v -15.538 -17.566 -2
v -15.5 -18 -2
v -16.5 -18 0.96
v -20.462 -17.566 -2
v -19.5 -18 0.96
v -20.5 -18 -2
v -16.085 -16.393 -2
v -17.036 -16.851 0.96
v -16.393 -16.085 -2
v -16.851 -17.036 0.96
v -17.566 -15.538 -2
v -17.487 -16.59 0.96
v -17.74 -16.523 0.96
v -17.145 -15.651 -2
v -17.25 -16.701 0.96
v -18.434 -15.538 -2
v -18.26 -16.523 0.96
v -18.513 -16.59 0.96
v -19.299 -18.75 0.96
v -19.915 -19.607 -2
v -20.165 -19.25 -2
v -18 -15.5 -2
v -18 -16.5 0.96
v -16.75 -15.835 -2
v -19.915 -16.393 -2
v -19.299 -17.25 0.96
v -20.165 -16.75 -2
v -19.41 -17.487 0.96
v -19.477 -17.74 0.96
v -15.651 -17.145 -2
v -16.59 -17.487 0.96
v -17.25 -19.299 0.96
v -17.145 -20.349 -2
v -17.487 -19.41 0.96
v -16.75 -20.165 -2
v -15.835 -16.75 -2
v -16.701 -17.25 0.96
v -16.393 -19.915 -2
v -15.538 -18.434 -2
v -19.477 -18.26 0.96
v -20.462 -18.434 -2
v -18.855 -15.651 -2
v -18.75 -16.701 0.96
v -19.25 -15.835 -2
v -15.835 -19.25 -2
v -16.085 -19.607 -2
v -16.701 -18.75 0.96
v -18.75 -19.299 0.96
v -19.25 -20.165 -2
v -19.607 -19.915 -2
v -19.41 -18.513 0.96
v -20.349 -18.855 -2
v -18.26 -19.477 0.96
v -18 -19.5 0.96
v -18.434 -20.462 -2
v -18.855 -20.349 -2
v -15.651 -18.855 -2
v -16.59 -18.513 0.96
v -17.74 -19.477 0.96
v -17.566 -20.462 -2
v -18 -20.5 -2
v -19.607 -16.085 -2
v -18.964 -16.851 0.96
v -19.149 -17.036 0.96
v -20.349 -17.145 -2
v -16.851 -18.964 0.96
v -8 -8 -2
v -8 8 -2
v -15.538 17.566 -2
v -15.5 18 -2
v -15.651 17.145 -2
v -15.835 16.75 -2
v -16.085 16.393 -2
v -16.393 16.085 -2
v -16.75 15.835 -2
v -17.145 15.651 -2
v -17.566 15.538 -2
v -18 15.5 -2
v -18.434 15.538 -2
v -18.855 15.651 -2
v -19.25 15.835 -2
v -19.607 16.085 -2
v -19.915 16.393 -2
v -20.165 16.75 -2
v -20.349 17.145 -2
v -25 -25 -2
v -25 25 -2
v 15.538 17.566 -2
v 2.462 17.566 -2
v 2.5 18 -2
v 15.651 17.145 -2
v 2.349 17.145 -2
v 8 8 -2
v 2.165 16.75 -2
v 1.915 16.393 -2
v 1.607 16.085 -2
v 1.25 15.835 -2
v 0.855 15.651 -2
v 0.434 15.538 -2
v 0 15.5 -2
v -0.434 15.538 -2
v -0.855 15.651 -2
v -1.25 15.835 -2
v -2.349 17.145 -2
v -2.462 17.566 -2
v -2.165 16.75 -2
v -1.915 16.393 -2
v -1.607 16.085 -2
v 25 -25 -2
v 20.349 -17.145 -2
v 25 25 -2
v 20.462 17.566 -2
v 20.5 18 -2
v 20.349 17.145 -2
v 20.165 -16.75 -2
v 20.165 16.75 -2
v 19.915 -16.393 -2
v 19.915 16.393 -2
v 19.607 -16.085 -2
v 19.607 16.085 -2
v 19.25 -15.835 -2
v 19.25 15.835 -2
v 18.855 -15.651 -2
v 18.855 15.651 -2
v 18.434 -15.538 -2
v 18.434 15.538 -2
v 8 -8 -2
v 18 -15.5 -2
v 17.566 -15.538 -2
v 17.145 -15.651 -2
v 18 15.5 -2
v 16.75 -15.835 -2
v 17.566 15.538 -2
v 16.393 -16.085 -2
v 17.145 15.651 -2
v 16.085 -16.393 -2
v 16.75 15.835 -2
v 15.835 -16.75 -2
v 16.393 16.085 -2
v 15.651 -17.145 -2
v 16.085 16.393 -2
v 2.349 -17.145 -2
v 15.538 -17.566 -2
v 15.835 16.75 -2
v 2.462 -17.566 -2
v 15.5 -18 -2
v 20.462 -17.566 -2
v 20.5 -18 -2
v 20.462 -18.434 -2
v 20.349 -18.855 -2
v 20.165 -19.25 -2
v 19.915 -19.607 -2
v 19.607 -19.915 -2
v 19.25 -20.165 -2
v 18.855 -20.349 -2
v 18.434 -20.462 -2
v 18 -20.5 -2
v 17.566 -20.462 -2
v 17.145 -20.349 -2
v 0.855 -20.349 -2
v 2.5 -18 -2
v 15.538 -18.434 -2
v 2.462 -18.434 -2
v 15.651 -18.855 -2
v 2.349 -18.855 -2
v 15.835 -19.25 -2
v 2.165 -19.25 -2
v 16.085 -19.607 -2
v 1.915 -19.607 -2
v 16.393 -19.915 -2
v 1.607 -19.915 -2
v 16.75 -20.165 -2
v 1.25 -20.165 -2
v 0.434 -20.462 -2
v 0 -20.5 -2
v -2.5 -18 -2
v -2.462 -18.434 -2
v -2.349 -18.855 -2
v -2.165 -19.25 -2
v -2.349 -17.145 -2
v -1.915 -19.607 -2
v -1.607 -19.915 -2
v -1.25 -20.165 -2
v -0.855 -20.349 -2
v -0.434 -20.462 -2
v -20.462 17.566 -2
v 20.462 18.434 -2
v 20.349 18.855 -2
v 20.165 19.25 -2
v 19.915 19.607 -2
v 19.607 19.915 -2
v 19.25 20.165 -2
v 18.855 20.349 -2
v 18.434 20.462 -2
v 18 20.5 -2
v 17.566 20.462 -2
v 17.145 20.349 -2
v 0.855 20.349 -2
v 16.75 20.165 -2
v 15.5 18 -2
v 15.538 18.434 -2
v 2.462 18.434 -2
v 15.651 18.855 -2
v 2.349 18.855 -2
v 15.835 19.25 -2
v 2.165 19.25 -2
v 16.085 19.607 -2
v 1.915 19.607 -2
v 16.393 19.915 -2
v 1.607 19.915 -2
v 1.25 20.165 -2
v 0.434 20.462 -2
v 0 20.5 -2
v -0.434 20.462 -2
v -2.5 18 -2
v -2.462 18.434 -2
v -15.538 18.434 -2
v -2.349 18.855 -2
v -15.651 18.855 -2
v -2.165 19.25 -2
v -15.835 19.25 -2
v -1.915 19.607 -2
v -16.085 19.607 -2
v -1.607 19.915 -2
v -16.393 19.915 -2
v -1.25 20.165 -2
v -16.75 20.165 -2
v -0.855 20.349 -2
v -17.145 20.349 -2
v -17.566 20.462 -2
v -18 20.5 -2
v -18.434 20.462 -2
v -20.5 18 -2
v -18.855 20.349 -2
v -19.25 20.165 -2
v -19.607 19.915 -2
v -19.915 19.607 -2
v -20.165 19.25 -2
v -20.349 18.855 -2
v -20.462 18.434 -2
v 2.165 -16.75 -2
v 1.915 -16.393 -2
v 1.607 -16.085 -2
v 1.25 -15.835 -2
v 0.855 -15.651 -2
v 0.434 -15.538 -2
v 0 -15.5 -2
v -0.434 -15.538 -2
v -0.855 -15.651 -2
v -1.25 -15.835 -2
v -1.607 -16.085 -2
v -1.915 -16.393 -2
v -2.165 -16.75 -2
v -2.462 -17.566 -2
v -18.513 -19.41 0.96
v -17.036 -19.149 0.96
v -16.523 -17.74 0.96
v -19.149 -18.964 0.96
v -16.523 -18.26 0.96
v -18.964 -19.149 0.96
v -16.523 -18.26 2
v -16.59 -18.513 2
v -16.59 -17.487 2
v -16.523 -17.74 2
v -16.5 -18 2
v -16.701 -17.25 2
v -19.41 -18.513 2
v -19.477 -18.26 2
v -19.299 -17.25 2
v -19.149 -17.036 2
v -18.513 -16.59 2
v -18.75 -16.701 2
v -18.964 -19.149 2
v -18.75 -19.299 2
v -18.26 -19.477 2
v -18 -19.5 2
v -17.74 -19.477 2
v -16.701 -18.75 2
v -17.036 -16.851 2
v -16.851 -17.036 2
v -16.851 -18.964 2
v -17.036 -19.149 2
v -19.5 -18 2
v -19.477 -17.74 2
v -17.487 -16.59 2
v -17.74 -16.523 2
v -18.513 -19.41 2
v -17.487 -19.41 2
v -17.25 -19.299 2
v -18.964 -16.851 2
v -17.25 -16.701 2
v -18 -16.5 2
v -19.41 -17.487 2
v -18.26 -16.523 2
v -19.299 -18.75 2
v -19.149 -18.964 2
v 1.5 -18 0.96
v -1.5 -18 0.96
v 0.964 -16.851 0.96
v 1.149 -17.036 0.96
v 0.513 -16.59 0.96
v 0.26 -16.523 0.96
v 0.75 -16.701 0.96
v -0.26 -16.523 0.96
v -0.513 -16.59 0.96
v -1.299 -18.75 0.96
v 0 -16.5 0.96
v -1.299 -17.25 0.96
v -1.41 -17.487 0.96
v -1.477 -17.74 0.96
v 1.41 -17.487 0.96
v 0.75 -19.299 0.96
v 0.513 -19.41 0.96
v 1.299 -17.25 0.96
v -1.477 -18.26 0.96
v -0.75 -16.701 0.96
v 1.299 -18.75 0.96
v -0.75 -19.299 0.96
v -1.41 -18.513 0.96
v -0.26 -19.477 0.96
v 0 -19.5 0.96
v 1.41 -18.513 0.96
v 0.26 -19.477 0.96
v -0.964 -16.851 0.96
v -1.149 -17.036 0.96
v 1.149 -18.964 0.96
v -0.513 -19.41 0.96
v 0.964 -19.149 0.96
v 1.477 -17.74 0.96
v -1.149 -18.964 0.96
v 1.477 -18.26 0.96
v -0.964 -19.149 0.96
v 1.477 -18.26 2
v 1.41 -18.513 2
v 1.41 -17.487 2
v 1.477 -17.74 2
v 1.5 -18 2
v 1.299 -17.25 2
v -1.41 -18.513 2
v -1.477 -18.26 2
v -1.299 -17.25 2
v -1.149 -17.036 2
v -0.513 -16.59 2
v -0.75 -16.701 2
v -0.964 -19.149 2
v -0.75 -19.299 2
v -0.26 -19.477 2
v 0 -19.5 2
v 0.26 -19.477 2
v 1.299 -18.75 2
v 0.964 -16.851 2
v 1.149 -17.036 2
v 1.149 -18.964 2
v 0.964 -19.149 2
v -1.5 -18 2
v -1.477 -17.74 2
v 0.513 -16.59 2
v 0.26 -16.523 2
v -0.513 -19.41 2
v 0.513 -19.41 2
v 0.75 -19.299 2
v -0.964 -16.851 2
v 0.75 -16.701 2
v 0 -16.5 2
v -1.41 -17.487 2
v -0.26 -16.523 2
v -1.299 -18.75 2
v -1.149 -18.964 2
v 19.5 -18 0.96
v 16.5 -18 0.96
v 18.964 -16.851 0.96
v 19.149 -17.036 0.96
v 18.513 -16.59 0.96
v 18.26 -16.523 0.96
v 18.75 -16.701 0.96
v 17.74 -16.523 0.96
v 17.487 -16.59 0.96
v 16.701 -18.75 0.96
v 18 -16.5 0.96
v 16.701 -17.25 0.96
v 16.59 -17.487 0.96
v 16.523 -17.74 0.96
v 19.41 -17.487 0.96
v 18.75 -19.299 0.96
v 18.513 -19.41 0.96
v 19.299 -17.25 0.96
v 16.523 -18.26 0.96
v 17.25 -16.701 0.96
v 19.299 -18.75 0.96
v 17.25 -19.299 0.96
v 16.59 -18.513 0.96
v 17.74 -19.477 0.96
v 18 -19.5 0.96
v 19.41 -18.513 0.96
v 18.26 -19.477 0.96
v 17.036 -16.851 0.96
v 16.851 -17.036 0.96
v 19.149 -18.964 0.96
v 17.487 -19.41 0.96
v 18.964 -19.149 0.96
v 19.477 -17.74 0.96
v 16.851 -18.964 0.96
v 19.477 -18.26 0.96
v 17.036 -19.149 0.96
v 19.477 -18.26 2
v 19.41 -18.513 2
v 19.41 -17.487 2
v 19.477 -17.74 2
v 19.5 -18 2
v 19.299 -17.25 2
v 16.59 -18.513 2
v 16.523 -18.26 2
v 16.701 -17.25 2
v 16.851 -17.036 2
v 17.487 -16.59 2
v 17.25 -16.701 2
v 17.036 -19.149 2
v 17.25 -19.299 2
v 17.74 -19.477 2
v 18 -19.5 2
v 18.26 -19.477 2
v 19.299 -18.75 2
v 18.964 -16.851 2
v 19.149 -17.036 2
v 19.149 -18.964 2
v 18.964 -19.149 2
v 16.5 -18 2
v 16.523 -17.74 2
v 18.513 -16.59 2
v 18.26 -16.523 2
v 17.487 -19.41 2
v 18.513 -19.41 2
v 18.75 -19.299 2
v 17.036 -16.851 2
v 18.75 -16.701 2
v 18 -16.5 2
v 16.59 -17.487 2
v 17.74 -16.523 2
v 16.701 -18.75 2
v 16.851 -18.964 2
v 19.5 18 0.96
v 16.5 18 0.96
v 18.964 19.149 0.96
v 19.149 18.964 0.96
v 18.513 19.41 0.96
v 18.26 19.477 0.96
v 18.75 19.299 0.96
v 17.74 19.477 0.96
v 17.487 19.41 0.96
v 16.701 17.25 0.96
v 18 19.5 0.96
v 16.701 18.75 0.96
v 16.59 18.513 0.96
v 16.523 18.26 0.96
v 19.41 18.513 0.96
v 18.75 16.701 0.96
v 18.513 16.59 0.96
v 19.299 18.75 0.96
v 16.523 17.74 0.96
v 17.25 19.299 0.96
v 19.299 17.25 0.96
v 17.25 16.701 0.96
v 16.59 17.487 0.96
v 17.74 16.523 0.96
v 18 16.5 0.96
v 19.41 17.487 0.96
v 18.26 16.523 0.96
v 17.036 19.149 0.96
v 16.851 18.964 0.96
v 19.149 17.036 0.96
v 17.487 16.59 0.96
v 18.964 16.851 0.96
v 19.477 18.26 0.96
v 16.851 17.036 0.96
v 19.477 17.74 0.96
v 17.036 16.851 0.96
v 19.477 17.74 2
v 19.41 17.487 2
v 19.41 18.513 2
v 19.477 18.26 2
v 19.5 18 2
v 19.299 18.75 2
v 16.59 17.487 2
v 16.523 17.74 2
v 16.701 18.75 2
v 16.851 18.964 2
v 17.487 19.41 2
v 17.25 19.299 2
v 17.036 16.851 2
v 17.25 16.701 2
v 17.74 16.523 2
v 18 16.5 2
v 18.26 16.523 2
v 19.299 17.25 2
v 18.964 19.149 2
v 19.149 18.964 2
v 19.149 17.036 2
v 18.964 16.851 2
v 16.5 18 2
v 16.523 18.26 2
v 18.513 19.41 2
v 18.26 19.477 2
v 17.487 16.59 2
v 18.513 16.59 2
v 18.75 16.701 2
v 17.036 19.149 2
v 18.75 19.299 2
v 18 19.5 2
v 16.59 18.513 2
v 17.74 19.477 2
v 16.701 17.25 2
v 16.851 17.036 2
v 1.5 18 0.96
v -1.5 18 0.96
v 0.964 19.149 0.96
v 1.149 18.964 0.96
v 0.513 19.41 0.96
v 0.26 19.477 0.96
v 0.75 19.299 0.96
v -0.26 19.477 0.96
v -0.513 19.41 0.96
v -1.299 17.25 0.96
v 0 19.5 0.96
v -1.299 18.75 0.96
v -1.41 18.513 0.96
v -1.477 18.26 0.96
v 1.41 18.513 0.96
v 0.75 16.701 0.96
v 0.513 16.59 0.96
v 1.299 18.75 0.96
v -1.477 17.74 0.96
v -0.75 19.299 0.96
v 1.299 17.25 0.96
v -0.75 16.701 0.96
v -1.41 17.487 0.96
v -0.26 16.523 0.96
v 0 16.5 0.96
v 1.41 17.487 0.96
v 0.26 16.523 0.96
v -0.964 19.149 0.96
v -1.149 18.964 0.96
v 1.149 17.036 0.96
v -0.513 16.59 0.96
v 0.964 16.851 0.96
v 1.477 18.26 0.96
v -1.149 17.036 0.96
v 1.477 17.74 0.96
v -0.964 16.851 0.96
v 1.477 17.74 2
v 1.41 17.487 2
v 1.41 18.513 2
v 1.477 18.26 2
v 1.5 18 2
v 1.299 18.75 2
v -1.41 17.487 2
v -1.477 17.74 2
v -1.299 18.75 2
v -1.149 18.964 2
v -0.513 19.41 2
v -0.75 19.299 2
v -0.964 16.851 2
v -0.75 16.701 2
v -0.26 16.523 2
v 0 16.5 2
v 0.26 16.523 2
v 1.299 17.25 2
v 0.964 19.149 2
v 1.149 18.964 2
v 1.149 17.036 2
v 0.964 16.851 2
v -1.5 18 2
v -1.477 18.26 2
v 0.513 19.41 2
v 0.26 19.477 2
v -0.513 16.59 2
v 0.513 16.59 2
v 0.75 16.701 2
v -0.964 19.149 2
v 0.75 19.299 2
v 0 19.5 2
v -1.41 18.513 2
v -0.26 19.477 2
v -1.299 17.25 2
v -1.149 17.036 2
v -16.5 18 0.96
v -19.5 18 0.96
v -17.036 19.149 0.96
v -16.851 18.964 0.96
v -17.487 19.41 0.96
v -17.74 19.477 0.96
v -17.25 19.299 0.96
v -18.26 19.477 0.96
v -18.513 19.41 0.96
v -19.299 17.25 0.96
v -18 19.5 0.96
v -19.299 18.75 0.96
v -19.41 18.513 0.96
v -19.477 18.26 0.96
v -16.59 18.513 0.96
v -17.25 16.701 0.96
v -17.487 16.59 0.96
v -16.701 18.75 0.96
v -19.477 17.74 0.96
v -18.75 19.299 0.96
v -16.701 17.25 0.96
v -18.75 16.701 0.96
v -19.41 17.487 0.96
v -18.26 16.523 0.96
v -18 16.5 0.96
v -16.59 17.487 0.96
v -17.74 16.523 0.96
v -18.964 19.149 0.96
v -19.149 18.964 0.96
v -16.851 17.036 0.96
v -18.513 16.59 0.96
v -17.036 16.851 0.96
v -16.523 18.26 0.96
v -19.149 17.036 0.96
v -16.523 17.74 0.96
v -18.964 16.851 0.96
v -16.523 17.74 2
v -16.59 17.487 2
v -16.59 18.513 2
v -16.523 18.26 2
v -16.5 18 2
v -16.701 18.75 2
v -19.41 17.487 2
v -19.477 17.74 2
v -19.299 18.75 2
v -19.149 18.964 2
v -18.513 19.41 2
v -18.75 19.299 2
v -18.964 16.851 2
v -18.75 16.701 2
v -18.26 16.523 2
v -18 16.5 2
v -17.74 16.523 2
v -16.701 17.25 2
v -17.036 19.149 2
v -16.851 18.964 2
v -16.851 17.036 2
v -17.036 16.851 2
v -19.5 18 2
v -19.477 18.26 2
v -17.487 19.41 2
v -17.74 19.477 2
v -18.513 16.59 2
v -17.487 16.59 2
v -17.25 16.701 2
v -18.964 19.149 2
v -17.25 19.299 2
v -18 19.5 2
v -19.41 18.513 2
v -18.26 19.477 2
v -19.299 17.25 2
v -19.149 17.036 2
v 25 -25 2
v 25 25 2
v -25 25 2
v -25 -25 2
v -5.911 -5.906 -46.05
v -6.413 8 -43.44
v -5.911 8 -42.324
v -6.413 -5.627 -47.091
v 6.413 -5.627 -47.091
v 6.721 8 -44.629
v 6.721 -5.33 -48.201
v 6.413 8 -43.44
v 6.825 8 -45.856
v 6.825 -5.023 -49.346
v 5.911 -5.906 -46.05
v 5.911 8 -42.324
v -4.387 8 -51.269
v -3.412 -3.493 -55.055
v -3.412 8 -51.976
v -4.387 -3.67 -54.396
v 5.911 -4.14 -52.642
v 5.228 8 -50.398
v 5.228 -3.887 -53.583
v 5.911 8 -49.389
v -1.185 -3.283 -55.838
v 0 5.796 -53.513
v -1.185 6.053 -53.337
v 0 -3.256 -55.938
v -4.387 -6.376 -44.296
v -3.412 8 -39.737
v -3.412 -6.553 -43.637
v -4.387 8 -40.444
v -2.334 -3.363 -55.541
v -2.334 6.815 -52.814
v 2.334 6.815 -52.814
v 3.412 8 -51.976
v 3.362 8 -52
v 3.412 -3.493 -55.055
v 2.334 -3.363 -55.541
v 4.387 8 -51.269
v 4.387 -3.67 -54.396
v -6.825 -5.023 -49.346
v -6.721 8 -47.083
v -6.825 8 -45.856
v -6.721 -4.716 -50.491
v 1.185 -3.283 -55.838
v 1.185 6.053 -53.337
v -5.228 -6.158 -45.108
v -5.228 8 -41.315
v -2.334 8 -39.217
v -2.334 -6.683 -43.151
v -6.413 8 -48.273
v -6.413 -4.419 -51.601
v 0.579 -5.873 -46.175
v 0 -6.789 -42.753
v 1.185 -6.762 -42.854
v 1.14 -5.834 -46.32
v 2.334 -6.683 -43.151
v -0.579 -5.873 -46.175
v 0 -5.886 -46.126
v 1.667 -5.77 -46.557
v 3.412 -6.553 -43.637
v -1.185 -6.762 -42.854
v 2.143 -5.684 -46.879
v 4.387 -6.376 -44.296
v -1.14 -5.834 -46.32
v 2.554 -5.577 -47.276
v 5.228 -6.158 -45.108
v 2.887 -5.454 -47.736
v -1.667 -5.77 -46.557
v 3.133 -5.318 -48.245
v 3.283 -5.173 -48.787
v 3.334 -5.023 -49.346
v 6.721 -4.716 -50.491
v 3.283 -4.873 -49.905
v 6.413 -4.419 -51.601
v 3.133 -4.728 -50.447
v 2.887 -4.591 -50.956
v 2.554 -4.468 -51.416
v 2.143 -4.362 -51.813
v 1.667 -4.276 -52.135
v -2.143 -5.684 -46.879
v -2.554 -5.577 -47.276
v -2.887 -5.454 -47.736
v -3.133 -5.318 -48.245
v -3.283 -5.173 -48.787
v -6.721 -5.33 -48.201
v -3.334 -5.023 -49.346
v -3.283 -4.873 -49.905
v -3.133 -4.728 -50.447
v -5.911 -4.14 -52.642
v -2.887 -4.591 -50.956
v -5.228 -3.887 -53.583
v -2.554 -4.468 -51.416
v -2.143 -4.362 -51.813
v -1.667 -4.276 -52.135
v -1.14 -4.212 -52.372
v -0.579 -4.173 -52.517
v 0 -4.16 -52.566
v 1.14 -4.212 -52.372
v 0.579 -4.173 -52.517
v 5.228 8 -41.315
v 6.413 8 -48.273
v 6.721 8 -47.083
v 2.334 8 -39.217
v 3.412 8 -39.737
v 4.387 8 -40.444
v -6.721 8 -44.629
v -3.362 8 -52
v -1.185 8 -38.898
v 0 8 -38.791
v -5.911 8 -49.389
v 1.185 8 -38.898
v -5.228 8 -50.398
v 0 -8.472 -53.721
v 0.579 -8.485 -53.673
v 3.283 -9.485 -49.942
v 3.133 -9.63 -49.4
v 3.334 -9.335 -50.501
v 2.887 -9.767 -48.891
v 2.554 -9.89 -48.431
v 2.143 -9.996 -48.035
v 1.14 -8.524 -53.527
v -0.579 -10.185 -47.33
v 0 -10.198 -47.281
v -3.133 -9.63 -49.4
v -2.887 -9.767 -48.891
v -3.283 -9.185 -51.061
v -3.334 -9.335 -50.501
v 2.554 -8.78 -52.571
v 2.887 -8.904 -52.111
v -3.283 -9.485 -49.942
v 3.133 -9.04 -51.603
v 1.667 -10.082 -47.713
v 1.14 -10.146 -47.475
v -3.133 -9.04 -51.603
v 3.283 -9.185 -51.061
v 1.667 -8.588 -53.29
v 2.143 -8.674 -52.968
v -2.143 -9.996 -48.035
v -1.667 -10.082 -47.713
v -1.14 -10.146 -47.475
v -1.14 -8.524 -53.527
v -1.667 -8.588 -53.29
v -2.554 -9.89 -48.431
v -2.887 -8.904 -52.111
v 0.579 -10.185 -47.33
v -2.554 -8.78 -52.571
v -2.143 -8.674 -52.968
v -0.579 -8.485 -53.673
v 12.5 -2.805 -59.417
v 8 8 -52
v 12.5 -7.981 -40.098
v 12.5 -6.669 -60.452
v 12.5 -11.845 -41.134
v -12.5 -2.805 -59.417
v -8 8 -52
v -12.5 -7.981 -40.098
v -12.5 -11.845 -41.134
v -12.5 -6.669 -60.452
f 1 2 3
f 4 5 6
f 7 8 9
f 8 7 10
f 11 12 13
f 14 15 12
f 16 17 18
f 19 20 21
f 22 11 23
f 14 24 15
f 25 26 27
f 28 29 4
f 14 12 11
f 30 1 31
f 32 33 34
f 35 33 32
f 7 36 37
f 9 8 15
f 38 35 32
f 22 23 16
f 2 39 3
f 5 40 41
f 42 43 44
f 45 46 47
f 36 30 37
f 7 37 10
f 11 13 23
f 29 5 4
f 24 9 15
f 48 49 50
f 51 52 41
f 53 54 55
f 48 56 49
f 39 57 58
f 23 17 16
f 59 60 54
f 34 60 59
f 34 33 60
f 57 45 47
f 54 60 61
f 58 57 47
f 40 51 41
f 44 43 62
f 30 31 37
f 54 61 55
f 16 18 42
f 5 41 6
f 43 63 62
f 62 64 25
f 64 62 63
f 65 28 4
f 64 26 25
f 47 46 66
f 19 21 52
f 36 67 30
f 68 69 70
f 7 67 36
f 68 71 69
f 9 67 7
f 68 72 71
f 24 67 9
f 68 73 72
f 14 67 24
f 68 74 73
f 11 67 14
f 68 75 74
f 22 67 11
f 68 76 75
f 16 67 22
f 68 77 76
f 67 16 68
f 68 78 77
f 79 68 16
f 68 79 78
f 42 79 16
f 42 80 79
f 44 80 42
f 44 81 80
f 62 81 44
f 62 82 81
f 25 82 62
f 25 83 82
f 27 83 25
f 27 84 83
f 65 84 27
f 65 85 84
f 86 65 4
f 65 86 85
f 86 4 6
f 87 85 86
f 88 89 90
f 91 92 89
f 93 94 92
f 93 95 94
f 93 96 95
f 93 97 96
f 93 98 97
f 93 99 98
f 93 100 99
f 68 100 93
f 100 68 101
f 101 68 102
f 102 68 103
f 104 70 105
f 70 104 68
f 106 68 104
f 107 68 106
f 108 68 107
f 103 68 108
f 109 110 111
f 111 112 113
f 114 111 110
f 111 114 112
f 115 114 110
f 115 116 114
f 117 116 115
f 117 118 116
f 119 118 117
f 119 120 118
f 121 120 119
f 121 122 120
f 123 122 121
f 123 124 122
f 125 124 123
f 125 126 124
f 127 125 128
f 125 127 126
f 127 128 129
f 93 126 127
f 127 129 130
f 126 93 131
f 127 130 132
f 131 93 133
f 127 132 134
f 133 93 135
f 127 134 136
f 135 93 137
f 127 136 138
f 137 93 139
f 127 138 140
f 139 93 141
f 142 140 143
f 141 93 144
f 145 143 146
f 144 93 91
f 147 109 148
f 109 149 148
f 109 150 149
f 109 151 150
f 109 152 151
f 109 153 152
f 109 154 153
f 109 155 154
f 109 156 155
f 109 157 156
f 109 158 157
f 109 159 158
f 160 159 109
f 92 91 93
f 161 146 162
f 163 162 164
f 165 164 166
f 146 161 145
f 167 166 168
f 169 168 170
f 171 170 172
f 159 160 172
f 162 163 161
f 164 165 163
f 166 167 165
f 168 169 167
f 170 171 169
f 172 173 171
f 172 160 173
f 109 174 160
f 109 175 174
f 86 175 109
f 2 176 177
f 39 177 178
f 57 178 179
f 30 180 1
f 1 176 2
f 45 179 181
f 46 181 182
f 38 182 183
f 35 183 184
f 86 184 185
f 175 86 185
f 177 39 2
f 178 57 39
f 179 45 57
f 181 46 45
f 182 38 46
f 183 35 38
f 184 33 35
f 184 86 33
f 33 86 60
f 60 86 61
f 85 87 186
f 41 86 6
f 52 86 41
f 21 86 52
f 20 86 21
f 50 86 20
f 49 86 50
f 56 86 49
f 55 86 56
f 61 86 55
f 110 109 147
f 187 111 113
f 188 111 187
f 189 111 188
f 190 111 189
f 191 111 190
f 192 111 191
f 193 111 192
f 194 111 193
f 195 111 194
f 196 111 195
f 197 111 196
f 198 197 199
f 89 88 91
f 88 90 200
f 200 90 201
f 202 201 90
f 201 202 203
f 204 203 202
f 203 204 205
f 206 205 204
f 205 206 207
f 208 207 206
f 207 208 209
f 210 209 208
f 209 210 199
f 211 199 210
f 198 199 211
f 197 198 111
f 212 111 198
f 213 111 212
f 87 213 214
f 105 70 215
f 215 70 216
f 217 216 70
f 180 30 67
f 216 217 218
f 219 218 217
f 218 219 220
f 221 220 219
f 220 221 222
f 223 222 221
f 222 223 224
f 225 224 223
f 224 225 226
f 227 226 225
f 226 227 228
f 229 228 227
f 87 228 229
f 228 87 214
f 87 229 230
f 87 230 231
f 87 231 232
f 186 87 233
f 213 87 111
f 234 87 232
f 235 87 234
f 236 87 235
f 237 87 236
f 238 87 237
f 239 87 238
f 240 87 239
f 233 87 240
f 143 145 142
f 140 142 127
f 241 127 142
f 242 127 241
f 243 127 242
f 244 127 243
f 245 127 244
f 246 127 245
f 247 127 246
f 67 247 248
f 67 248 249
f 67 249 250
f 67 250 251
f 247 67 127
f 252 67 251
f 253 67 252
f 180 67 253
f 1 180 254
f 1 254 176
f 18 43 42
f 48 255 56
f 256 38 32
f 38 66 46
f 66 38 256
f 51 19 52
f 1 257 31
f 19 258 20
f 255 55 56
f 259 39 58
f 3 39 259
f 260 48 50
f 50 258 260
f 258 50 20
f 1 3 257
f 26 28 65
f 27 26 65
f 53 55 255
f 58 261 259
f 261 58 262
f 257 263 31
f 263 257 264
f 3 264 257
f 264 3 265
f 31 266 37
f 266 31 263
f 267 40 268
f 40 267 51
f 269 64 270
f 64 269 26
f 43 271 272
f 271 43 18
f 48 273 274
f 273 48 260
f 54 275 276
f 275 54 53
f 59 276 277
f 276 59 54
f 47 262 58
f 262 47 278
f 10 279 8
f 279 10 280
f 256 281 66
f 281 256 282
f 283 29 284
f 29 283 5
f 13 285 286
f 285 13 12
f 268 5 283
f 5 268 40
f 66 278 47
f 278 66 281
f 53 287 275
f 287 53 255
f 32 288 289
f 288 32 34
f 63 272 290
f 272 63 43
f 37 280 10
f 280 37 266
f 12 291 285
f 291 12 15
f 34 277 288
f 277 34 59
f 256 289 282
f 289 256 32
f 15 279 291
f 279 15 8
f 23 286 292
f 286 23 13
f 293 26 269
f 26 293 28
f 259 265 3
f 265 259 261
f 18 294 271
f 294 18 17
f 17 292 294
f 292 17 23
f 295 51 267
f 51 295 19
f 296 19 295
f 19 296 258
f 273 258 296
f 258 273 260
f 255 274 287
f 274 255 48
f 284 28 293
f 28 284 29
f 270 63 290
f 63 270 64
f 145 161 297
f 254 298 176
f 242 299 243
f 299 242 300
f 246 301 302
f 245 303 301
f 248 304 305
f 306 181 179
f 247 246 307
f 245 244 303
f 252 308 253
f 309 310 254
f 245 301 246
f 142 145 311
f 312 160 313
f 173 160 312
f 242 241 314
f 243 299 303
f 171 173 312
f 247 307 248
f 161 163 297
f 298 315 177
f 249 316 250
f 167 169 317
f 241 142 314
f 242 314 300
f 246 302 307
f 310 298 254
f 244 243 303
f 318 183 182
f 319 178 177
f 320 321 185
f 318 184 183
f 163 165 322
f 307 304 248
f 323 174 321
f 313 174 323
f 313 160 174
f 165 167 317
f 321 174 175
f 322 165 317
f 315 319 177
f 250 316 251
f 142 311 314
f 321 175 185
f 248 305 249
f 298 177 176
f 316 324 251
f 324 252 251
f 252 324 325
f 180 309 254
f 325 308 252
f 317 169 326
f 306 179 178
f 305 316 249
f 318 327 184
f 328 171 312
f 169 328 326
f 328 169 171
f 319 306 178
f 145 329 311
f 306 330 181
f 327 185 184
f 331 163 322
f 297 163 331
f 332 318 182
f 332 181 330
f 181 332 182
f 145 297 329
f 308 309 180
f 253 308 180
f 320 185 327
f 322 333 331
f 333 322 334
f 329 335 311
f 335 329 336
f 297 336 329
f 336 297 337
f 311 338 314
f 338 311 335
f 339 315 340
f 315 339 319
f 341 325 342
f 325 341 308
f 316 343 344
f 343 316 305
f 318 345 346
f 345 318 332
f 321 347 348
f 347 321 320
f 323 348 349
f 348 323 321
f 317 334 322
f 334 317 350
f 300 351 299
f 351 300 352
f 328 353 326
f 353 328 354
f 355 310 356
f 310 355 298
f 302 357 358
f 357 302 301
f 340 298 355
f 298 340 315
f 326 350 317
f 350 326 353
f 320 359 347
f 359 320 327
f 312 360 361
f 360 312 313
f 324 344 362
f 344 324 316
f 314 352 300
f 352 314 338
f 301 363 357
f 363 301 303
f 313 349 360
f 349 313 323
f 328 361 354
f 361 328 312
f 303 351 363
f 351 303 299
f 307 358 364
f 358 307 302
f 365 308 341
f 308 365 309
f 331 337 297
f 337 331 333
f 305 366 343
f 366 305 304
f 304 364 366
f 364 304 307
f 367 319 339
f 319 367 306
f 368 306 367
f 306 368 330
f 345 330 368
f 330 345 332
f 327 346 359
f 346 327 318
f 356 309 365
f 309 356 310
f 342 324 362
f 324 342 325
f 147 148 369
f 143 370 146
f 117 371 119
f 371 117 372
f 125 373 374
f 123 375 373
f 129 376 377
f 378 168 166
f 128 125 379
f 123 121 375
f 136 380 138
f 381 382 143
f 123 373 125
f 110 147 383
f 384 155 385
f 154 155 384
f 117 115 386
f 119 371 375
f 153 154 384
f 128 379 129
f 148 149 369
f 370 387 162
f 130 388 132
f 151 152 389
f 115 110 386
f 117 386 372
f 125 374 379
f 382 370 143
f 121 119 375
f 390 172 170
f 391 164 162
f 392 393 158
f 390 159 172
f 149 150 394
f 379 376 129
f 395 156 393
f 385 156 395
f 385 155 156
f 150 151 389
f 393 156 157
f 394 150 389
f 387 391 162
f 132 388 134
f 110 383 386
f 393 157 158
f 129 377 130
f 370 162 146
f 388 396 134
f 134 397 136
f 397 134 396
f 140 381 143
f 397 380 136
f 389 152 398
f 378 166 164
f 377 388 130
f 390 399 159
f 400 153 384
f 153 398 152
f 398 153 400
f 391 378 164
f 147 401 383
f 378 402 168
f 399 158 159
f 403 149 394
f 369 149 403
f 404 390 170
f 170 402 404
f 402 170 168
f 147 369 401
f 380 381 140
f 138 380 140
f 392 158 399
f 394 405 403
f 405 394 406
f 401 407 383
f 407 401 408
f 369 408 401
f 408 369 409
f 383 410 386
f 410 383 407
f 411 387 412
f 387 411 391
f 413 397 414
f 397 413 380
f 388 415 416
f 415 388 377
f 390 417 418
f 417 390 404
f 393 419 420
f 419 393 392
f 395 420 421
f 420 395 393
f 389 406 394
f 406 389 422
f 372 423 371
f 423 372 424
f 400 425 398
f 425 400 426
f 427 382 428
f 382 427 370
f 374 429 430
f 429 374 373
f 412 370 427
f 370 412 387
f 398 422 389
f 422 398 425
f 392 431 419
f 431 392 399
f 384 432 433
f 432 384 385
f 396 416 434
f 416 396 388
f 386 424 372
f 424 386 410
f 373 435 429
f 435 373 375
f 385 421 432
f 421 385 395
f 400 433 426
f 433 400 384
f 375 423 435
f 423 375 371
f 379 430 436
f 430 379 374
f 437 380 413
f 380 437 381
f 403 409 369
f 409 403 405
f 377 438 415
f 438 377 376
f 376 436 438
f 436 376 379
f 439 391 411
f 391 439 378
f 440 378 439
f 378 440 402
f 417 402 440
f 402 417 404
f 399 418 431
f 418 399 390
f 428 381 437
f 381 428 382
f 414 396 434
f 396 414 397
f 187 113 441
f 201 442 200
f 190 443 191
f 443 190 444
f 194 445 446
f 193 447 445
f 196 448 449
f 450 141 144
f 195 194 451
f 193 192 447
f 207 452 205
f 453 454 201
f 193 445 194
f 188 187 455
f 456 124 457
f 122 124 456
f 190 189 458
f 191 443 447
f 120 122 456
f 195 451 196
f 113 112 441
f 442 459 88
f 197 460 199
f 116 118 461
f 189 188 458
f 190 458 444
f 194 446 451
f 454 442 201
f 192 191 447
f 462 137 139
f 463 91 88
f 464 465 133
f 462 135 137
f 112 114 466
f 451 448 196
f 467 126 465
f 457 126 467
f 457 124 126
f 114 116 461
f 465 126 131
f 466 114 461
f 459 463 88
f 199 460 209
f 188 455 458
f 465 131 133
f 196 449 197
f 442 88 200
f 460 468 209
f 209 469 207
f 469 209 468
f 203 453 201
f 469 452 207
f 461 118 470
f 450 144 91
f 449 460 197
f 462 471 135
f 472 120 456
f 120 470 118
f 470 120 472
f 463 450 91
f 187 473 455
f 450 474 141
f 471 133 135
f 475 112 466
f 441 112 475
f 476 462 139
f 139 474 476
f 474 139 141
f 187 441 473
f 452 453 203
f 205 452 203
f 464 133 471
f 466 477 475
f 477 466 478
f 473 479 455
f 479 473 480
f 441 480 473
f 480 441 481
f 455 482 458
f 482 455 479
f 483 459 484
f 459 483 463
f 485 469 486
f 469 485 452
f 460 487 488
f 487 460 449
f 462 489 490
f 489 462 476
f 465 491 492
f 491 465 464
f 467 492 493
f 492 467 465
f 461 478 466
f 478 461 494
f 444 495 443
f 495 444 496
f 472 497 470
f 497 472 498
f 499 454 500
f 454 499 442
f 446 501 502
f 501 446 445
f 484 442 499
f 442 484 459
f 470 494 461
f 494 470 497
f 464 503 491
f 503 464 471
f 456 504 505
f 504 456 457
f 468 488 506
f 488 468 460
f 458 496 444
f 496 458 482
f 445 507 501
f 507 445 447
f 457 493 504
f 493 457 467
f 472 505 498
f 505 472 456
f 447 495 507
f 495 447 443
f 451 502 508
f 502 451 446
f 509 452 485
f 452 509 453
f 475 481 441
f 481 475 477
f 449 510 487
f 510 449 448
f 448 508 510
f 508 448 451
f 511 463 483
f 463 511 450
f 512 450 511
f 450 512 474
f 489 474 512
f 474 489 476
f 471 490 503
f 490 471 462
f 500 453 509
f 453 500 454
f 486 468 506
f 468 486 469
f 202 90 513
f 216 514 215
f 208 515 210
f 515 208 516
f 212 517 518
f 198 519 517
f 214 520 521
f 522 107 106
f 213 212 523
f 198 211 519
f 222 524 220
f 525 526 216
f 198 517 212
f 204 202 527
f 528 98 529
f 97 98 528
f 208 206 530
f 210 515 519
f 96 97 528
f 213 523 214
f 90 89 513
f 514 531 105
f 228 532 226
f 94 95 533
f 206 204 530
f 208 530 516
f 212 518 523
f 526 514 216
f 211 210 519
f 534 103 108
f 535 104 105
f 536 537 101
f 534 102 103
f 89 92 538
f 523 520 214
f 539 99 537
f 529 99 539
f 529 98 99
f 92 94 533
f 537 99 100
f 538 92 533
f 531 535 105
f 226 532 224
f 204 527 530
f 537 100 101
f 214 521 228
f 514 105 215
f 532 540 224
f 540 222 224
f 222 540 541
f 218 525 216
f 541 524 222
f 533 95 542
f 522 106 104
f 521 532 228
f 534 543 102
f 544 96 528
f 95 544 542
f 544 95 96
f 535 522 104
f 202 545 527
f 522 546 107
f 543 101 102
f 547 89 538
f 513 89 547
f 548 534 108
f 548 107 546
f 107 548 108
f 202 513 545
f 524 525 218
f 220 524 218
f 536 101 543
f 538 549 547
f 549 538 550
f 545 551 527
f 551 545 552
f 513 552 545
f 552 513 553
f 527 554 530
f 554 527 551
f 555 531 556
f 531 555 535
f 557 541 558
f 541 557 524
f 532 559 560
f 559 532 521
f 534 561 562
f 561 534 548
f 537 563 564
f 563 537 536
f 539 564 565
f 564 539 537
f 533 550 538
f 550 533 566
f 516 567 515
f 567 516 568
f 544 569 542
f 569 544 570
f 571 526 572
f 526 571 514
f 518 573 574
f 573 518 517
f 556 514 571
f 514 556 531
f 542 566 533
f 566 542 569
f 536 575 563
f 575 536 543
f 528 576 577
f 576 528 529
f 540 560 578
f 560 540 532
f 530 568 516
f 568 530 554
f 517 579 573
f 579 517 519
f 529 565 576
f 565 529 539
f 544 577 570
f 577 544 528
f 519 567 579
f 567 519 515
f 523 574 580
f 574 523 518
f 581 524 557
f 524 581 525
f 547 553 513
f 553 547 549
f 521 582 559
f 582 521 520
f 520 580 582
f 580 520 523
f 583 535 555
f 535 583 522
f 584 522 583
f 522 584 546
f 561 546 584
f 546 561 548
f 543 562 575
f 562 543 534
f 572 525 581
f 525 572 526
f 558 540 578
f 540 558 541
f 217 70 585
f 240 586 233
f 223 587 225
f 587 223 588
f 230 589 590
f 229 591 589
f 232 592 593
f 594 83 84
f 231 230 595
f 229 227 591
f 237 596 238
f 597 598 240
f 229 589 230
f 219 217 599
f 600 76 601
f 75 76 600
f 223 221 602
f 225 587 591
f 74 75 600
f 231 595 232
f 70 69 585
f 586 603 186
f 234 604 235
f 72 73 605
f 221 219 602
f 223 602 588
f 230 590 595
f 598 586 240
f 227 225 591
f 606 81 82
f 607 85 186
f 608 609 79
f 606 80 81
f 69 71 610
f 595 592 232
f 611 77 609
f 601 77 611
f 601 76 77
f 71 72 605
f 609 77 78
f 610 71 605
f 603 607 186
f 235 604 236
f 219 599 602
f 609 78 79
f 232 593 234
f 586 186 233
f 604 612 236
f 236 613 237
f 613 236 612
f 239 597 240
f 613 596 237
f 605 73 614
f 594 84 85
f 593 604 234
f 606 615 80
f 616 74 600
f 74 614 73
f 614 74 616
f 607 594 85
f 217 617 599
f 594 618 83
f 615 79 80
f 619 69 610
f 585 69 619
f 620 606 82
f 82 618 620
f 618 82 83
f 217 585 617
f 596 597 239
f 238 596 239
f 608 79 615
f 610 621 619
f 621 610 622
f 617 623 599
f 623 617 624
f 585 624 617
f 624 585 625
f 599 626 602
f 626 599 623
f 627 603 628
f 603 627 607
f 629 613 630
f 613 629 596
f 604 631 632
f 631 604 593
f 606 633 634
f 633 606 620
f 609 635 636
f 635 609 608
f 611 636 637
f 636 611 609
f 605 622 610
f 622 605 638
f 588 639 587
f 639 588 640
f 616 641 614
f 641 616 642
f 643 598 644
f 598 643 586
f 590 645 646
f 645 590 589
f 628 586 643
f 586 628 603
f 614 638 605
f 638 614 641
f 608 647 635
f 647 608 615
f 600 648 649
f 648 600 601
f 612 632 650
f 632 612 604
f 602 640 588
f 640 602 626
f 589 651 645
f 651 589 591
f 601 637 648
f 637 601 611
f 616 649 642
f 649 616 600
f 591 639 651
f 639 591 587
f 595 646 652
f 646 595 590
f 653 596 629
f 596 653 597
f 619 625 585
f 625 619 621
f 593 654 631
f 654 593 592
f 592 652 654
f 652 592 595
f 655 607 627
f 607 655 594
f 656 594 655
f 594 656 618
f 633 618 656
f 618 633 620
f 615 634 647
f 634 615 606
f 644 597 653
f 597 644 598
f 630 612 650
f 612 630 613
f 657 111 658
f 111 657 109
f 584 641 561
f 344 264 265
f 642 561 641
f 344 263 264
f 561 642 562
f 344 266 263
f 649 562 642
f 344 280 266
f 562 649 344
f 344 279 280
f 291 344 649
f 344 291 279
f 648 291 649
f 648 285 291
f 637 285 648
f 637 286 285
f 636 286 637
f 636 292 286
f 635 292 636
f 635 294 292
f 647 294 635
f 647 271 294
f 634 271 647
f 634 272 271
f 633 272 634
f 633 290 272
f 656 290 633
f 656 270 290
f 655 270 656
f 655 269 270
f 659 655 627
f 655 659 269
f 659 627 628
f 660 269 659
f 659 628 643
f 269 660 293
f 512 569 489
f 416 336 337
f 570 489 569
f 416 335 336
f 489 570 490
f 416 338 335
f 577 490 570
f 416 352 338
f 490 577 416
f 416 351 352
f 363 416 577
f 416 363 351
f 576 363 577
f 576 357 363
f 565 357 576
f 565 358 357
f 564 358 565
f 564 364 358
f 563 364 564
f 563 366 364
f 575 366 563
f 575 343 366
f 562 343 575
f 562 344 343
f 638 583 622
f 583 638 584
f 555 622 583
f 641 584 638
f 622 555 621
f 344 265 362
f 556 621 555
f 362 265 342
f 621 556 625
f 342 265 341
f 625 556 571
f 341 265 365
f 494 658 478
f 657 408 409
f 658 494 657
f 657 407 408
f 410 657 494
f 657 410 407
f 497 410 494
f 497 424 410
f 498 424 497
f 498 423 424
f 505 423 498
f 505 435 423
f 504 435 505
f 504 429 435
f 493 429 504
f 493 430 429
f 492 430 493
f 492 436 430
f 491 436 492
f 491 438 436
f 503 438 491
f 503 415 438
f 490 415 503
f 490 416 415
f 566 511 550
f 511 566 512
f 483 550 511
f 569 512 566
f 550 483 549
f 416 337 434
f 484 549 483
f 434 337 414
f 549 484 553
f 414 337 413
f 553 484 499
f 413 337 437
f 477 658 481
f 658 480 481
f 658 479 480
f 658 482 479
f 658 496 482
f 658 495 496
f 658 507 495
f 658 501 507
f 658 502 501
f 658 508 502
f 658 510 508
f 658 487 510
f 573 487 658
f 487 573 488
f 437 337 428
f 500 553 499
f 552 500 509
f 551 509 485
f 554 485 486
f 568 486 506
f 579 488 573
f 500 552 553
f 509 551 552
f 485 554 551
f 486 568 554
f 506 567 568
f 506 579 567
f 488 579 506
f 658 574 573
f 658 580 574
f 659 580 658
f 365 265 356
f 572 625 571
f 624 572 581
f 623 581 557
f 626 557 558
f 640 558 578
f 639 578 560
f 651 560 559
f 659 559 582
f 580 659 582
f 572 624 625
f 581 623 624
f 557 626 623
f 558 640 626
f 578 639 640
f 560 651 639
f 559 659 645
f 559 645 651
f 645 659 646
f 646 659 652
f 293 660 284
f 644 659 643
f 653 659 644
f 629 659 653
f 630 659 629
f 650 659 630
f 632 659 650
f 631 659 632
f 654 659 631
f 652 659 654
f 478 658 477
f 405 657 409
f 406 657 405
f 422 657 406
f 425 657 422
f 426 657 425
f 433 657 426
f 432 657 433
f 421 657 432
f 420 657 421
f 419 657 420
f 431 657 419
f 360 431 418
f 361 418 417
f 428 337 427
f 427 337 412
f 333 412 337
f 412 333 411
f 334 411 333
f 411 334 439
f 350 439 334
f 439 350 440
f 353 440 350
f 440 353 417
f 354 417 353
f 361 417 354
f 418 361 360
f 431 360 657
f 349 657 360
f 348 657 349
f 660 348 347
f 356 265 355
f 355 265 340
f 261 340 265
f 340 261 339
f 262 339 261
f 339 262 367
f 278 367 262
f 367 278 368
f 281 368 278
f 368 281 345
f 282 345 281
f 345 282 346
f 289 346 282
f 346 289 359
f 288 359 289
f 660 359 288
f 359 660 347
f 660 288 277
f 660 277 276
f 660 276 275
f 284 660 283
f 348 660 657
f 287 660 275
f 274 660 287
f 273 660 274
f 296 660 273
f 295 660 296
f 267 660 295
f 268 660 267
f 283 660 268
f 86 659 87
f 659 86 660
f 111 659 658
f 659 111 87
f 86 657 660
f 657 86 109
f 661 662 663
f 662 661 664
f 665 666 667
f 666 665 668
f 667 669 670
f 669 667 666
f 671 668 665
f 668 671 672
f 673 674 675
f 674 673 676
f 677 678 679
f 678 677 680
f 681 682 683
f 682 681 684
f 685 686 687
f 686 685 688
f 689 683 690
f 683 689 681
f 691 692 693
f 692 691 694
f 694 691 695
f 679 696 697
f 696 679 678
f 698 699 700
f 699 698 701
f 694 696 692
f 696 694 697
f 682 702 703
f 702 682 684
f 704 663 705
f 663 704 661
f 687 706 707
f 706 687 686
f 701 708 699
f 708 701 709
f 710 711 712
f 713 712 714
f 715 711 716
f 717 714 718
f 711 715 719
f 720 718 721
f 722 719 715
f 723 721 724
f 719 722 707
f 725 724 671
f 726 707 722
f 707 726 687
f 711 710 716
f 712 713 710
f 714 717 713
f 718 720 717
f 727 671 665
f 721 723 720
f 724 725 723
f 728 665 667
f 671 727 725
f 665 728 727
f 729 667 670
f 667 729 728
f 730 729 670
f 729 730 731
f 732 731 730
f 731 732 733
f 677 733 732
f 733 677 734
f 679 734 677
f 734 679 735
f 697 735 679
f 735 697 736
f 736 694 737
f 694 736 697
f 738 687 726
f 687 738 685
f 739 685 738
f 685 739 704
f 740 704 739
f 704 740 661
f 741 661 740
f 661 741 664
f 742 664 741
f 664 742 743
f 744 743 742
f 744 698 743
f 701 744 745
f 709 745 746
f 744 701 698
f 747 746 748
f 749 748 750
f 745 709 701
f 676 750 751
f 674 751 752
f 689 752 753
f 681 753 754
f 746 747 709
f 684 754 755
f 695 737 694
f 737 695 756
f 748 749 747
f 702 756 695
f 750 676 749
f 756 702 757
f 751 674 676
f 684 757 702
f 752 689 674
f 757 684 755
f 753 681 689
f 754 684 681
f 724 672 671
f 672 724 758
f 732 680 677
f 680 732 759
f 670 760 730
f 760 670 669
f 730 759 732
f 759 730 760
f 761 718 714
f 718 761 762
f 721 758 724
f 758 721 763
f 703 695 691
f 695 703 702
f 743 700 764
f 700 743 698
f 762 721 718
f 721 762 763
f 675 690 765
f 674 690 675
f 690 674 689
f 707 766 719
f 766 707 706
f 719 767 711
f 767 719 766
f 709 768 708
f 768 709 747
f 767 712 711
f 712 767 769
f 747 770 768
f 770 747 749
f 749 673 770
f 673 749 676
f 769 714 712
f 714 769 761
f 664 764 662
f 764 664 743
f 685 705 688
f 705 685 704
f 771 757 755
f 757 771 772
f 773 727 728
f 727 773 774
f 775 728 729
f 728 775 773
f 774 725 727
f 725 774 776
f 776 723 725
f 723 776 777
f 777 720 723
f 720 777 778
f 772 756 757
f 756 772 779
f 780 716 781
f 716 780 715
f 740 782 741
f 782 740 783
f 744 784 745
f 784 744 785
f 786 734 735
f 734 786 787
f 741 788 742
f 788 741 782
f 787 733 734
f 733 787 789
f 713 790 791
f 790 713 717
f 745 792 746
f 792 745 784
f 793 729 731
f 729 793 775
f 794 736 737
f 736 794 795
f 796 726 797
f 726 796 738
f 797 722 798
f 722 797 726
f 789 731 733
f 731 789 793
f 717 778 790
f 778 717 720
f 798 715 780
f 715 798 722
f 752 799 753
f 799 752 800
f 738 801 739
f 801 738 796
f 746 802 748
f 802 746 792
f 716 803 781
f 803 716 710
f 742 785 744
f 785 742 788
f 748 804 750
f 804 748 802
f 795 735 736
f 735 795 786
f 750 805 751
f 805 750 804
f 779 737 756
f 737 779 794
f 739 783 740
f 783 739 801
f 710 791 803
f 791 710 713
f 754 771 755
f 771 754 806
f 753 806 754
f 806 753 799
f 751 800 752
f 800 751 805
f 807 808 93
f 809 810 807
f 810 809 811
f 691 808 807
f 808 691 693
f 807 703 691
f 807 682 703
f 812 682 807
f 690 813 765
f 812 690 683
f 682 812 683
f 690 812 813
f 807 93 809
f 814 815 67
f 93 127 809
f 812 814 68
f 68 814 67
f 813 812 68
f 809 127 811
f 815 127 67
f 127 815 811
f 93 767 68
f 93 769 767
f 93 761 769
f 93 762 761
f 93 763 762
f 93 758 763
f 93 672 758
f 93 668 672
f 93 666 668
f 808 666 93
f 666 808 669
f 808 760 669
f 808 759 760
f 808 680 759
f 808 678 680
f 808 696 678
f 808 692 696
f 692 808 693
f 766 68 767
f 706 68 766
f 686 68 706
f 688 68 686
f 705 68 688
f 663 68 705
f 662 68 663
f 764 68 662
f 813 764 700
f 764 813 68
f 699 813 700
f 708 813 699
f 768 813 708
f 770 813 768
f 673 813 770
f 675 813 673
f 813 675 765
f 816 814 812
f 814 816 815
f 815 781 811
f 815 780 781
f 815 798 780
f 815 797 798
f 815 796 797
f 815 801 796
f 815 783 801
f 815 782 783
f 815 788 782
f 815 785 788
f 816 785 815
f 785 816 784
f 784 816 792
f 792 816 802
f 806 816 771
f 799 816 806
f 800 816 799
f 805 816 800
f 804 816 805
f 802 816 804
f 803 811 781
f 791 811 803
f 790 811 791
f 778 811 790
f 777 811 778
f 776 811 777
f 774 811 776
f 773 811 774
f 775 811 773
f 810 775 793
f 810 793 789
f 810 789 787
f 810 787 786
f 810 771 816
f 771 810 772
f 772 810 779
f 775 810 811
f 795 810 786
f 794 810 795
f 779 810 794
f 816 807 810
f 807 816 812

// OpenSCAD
// file: MiniSpax.scad
//Höhe Spax-Schraubenkopf
sk=1.7;
//Spax oben
so=5.0;
//Spax Durchmesser Gewinde
sd=3.0;
//Spax Höhe Gewinde
shg=10;
//Schraubenzieher-Zusatz, damit man oben bequem hinkommt, In der Mitte Loch und links rechts nochmal so viel Platz wie das Gewinde
sz=so+sd*2;

//Thickness
t=2.96;//1.7+1.1;//=2.8 ==> recommended from slicer 2.96

module spax()
{    
    color("silver")
        {        
        cylinder(h=t,d1=so,d2=sd);
        
        translate([0,0,0])
        cylinder(h=shg,d1=sd,d2=sd);
        }
}
// main file
include<MiniSpax.scad>

$fn=36;

//Durchmesser Schraube
ds=6.35; //= 1/4 Zoll
//Länge Schraubenhals
lsh=11.2;
//Höhe/Länge Schraubenkopf Total (falls wir Abstand brauchen)
hs=4.6;
//Durchmesser Beilagscheibe integriert
db=13;
//Höhe Beilagscheibe
hb=1.25;
//Durchmesser Mutternkopf
dm=10.85;
//Länge Schraube toal
lst=16.4;
//Höhe Mutternkopf
hm=lst-hb-lsh;

//Breite Connector
bc=50;
//Tiefe Connector
tc=4.0;

//Höhe Box vorne
hbv=100;
//Höhe Box hinten
hbh=77;
//Abstand Schraubenlochzentrum zu hinten Rand
aslz=28.3;
//Kabelabstand hintere obere Kante
kah=40;

//Connector down => h/2 ist mehr als genug, siehe Skizze in Microsoft Whiteboard
cd=hbv/2;
//Connectorbreite => 50 sollte trptz Krümmung ohne Probleme gehen
cb=50;
//Winkel
winkeldown=15;

//Abstand der Spax vom Rand
ar=7;

module schraube()
{
    cylinder(h=hm, d=dm);

    translate([0,0,hm])
    cylinder(h=hb, d=db); //Original        

    translate([0,0,hm+hb])
    cylinder(h=lsh, d=ds); //Original    
}

module schrauben_bohrung()
{
    cylinder(h=hm, d=dm);

    //translate([0,0,hm])
    //cylinder(h=hb, d=db); //Original    
    translate([0,0,-40+hm+hb]) //Bohrungsröhre
    cylinder(h=40, d=db*1.05);

    translate([0,0,hm+hb])
    //cylinder(h=lsh, d=ds); //Original
    cylinder(h=lsh, d=ds*1.05); //Bohrungsröhre
}

module connector_holzplatte()
{
    cube([bc,bc,tc], center=true);
}

module connector_down()
{
    xy=16;
    translate([0,0,-cd/2-tc/2])
    cube([xy,xy,cd], center=true);
}

module connector_speaker()
{
    rotate([winkeldown,0,0])
    translate([0,bc/2-tc/2,-cd-tc/2])
    cube([cb/2,tc,20], center=true);
}

module schraubenbohrung_unten()
{    
    translate([0,0,-48]) //Passt fast perfekt mit y=0
    color("gray")
    rotate([90+15,0,0])
    schrauben_bohrung();
}

module allespax()
{
    translate([-bc/2+ar,-bc/2+ar,-tc/2])
    spax();

    translate([0,-bc/2+ar,-tc/2])
    spax();

    translate([bc/2-ar,-bc/2+ar,-tc/2])
    spax();

    translate([bc/2-ar,bc/2-ar,-tc/2])
    spax();

    translate([0,bc/2-ar,-tc/2])
    spax();

    translate([-bc/2+ar,bc/2-ar,-tc/2])
    spax();
}

//color("gray")
//schraube();

difference()
{
    connector_holzplatte();
    allespax();
}

difference()
{
    hull()
    {
        connector_down();
        
        translate([0,-43,-6])
        connector_speaker();
    }
    schraubenbohrung_unten();
}
